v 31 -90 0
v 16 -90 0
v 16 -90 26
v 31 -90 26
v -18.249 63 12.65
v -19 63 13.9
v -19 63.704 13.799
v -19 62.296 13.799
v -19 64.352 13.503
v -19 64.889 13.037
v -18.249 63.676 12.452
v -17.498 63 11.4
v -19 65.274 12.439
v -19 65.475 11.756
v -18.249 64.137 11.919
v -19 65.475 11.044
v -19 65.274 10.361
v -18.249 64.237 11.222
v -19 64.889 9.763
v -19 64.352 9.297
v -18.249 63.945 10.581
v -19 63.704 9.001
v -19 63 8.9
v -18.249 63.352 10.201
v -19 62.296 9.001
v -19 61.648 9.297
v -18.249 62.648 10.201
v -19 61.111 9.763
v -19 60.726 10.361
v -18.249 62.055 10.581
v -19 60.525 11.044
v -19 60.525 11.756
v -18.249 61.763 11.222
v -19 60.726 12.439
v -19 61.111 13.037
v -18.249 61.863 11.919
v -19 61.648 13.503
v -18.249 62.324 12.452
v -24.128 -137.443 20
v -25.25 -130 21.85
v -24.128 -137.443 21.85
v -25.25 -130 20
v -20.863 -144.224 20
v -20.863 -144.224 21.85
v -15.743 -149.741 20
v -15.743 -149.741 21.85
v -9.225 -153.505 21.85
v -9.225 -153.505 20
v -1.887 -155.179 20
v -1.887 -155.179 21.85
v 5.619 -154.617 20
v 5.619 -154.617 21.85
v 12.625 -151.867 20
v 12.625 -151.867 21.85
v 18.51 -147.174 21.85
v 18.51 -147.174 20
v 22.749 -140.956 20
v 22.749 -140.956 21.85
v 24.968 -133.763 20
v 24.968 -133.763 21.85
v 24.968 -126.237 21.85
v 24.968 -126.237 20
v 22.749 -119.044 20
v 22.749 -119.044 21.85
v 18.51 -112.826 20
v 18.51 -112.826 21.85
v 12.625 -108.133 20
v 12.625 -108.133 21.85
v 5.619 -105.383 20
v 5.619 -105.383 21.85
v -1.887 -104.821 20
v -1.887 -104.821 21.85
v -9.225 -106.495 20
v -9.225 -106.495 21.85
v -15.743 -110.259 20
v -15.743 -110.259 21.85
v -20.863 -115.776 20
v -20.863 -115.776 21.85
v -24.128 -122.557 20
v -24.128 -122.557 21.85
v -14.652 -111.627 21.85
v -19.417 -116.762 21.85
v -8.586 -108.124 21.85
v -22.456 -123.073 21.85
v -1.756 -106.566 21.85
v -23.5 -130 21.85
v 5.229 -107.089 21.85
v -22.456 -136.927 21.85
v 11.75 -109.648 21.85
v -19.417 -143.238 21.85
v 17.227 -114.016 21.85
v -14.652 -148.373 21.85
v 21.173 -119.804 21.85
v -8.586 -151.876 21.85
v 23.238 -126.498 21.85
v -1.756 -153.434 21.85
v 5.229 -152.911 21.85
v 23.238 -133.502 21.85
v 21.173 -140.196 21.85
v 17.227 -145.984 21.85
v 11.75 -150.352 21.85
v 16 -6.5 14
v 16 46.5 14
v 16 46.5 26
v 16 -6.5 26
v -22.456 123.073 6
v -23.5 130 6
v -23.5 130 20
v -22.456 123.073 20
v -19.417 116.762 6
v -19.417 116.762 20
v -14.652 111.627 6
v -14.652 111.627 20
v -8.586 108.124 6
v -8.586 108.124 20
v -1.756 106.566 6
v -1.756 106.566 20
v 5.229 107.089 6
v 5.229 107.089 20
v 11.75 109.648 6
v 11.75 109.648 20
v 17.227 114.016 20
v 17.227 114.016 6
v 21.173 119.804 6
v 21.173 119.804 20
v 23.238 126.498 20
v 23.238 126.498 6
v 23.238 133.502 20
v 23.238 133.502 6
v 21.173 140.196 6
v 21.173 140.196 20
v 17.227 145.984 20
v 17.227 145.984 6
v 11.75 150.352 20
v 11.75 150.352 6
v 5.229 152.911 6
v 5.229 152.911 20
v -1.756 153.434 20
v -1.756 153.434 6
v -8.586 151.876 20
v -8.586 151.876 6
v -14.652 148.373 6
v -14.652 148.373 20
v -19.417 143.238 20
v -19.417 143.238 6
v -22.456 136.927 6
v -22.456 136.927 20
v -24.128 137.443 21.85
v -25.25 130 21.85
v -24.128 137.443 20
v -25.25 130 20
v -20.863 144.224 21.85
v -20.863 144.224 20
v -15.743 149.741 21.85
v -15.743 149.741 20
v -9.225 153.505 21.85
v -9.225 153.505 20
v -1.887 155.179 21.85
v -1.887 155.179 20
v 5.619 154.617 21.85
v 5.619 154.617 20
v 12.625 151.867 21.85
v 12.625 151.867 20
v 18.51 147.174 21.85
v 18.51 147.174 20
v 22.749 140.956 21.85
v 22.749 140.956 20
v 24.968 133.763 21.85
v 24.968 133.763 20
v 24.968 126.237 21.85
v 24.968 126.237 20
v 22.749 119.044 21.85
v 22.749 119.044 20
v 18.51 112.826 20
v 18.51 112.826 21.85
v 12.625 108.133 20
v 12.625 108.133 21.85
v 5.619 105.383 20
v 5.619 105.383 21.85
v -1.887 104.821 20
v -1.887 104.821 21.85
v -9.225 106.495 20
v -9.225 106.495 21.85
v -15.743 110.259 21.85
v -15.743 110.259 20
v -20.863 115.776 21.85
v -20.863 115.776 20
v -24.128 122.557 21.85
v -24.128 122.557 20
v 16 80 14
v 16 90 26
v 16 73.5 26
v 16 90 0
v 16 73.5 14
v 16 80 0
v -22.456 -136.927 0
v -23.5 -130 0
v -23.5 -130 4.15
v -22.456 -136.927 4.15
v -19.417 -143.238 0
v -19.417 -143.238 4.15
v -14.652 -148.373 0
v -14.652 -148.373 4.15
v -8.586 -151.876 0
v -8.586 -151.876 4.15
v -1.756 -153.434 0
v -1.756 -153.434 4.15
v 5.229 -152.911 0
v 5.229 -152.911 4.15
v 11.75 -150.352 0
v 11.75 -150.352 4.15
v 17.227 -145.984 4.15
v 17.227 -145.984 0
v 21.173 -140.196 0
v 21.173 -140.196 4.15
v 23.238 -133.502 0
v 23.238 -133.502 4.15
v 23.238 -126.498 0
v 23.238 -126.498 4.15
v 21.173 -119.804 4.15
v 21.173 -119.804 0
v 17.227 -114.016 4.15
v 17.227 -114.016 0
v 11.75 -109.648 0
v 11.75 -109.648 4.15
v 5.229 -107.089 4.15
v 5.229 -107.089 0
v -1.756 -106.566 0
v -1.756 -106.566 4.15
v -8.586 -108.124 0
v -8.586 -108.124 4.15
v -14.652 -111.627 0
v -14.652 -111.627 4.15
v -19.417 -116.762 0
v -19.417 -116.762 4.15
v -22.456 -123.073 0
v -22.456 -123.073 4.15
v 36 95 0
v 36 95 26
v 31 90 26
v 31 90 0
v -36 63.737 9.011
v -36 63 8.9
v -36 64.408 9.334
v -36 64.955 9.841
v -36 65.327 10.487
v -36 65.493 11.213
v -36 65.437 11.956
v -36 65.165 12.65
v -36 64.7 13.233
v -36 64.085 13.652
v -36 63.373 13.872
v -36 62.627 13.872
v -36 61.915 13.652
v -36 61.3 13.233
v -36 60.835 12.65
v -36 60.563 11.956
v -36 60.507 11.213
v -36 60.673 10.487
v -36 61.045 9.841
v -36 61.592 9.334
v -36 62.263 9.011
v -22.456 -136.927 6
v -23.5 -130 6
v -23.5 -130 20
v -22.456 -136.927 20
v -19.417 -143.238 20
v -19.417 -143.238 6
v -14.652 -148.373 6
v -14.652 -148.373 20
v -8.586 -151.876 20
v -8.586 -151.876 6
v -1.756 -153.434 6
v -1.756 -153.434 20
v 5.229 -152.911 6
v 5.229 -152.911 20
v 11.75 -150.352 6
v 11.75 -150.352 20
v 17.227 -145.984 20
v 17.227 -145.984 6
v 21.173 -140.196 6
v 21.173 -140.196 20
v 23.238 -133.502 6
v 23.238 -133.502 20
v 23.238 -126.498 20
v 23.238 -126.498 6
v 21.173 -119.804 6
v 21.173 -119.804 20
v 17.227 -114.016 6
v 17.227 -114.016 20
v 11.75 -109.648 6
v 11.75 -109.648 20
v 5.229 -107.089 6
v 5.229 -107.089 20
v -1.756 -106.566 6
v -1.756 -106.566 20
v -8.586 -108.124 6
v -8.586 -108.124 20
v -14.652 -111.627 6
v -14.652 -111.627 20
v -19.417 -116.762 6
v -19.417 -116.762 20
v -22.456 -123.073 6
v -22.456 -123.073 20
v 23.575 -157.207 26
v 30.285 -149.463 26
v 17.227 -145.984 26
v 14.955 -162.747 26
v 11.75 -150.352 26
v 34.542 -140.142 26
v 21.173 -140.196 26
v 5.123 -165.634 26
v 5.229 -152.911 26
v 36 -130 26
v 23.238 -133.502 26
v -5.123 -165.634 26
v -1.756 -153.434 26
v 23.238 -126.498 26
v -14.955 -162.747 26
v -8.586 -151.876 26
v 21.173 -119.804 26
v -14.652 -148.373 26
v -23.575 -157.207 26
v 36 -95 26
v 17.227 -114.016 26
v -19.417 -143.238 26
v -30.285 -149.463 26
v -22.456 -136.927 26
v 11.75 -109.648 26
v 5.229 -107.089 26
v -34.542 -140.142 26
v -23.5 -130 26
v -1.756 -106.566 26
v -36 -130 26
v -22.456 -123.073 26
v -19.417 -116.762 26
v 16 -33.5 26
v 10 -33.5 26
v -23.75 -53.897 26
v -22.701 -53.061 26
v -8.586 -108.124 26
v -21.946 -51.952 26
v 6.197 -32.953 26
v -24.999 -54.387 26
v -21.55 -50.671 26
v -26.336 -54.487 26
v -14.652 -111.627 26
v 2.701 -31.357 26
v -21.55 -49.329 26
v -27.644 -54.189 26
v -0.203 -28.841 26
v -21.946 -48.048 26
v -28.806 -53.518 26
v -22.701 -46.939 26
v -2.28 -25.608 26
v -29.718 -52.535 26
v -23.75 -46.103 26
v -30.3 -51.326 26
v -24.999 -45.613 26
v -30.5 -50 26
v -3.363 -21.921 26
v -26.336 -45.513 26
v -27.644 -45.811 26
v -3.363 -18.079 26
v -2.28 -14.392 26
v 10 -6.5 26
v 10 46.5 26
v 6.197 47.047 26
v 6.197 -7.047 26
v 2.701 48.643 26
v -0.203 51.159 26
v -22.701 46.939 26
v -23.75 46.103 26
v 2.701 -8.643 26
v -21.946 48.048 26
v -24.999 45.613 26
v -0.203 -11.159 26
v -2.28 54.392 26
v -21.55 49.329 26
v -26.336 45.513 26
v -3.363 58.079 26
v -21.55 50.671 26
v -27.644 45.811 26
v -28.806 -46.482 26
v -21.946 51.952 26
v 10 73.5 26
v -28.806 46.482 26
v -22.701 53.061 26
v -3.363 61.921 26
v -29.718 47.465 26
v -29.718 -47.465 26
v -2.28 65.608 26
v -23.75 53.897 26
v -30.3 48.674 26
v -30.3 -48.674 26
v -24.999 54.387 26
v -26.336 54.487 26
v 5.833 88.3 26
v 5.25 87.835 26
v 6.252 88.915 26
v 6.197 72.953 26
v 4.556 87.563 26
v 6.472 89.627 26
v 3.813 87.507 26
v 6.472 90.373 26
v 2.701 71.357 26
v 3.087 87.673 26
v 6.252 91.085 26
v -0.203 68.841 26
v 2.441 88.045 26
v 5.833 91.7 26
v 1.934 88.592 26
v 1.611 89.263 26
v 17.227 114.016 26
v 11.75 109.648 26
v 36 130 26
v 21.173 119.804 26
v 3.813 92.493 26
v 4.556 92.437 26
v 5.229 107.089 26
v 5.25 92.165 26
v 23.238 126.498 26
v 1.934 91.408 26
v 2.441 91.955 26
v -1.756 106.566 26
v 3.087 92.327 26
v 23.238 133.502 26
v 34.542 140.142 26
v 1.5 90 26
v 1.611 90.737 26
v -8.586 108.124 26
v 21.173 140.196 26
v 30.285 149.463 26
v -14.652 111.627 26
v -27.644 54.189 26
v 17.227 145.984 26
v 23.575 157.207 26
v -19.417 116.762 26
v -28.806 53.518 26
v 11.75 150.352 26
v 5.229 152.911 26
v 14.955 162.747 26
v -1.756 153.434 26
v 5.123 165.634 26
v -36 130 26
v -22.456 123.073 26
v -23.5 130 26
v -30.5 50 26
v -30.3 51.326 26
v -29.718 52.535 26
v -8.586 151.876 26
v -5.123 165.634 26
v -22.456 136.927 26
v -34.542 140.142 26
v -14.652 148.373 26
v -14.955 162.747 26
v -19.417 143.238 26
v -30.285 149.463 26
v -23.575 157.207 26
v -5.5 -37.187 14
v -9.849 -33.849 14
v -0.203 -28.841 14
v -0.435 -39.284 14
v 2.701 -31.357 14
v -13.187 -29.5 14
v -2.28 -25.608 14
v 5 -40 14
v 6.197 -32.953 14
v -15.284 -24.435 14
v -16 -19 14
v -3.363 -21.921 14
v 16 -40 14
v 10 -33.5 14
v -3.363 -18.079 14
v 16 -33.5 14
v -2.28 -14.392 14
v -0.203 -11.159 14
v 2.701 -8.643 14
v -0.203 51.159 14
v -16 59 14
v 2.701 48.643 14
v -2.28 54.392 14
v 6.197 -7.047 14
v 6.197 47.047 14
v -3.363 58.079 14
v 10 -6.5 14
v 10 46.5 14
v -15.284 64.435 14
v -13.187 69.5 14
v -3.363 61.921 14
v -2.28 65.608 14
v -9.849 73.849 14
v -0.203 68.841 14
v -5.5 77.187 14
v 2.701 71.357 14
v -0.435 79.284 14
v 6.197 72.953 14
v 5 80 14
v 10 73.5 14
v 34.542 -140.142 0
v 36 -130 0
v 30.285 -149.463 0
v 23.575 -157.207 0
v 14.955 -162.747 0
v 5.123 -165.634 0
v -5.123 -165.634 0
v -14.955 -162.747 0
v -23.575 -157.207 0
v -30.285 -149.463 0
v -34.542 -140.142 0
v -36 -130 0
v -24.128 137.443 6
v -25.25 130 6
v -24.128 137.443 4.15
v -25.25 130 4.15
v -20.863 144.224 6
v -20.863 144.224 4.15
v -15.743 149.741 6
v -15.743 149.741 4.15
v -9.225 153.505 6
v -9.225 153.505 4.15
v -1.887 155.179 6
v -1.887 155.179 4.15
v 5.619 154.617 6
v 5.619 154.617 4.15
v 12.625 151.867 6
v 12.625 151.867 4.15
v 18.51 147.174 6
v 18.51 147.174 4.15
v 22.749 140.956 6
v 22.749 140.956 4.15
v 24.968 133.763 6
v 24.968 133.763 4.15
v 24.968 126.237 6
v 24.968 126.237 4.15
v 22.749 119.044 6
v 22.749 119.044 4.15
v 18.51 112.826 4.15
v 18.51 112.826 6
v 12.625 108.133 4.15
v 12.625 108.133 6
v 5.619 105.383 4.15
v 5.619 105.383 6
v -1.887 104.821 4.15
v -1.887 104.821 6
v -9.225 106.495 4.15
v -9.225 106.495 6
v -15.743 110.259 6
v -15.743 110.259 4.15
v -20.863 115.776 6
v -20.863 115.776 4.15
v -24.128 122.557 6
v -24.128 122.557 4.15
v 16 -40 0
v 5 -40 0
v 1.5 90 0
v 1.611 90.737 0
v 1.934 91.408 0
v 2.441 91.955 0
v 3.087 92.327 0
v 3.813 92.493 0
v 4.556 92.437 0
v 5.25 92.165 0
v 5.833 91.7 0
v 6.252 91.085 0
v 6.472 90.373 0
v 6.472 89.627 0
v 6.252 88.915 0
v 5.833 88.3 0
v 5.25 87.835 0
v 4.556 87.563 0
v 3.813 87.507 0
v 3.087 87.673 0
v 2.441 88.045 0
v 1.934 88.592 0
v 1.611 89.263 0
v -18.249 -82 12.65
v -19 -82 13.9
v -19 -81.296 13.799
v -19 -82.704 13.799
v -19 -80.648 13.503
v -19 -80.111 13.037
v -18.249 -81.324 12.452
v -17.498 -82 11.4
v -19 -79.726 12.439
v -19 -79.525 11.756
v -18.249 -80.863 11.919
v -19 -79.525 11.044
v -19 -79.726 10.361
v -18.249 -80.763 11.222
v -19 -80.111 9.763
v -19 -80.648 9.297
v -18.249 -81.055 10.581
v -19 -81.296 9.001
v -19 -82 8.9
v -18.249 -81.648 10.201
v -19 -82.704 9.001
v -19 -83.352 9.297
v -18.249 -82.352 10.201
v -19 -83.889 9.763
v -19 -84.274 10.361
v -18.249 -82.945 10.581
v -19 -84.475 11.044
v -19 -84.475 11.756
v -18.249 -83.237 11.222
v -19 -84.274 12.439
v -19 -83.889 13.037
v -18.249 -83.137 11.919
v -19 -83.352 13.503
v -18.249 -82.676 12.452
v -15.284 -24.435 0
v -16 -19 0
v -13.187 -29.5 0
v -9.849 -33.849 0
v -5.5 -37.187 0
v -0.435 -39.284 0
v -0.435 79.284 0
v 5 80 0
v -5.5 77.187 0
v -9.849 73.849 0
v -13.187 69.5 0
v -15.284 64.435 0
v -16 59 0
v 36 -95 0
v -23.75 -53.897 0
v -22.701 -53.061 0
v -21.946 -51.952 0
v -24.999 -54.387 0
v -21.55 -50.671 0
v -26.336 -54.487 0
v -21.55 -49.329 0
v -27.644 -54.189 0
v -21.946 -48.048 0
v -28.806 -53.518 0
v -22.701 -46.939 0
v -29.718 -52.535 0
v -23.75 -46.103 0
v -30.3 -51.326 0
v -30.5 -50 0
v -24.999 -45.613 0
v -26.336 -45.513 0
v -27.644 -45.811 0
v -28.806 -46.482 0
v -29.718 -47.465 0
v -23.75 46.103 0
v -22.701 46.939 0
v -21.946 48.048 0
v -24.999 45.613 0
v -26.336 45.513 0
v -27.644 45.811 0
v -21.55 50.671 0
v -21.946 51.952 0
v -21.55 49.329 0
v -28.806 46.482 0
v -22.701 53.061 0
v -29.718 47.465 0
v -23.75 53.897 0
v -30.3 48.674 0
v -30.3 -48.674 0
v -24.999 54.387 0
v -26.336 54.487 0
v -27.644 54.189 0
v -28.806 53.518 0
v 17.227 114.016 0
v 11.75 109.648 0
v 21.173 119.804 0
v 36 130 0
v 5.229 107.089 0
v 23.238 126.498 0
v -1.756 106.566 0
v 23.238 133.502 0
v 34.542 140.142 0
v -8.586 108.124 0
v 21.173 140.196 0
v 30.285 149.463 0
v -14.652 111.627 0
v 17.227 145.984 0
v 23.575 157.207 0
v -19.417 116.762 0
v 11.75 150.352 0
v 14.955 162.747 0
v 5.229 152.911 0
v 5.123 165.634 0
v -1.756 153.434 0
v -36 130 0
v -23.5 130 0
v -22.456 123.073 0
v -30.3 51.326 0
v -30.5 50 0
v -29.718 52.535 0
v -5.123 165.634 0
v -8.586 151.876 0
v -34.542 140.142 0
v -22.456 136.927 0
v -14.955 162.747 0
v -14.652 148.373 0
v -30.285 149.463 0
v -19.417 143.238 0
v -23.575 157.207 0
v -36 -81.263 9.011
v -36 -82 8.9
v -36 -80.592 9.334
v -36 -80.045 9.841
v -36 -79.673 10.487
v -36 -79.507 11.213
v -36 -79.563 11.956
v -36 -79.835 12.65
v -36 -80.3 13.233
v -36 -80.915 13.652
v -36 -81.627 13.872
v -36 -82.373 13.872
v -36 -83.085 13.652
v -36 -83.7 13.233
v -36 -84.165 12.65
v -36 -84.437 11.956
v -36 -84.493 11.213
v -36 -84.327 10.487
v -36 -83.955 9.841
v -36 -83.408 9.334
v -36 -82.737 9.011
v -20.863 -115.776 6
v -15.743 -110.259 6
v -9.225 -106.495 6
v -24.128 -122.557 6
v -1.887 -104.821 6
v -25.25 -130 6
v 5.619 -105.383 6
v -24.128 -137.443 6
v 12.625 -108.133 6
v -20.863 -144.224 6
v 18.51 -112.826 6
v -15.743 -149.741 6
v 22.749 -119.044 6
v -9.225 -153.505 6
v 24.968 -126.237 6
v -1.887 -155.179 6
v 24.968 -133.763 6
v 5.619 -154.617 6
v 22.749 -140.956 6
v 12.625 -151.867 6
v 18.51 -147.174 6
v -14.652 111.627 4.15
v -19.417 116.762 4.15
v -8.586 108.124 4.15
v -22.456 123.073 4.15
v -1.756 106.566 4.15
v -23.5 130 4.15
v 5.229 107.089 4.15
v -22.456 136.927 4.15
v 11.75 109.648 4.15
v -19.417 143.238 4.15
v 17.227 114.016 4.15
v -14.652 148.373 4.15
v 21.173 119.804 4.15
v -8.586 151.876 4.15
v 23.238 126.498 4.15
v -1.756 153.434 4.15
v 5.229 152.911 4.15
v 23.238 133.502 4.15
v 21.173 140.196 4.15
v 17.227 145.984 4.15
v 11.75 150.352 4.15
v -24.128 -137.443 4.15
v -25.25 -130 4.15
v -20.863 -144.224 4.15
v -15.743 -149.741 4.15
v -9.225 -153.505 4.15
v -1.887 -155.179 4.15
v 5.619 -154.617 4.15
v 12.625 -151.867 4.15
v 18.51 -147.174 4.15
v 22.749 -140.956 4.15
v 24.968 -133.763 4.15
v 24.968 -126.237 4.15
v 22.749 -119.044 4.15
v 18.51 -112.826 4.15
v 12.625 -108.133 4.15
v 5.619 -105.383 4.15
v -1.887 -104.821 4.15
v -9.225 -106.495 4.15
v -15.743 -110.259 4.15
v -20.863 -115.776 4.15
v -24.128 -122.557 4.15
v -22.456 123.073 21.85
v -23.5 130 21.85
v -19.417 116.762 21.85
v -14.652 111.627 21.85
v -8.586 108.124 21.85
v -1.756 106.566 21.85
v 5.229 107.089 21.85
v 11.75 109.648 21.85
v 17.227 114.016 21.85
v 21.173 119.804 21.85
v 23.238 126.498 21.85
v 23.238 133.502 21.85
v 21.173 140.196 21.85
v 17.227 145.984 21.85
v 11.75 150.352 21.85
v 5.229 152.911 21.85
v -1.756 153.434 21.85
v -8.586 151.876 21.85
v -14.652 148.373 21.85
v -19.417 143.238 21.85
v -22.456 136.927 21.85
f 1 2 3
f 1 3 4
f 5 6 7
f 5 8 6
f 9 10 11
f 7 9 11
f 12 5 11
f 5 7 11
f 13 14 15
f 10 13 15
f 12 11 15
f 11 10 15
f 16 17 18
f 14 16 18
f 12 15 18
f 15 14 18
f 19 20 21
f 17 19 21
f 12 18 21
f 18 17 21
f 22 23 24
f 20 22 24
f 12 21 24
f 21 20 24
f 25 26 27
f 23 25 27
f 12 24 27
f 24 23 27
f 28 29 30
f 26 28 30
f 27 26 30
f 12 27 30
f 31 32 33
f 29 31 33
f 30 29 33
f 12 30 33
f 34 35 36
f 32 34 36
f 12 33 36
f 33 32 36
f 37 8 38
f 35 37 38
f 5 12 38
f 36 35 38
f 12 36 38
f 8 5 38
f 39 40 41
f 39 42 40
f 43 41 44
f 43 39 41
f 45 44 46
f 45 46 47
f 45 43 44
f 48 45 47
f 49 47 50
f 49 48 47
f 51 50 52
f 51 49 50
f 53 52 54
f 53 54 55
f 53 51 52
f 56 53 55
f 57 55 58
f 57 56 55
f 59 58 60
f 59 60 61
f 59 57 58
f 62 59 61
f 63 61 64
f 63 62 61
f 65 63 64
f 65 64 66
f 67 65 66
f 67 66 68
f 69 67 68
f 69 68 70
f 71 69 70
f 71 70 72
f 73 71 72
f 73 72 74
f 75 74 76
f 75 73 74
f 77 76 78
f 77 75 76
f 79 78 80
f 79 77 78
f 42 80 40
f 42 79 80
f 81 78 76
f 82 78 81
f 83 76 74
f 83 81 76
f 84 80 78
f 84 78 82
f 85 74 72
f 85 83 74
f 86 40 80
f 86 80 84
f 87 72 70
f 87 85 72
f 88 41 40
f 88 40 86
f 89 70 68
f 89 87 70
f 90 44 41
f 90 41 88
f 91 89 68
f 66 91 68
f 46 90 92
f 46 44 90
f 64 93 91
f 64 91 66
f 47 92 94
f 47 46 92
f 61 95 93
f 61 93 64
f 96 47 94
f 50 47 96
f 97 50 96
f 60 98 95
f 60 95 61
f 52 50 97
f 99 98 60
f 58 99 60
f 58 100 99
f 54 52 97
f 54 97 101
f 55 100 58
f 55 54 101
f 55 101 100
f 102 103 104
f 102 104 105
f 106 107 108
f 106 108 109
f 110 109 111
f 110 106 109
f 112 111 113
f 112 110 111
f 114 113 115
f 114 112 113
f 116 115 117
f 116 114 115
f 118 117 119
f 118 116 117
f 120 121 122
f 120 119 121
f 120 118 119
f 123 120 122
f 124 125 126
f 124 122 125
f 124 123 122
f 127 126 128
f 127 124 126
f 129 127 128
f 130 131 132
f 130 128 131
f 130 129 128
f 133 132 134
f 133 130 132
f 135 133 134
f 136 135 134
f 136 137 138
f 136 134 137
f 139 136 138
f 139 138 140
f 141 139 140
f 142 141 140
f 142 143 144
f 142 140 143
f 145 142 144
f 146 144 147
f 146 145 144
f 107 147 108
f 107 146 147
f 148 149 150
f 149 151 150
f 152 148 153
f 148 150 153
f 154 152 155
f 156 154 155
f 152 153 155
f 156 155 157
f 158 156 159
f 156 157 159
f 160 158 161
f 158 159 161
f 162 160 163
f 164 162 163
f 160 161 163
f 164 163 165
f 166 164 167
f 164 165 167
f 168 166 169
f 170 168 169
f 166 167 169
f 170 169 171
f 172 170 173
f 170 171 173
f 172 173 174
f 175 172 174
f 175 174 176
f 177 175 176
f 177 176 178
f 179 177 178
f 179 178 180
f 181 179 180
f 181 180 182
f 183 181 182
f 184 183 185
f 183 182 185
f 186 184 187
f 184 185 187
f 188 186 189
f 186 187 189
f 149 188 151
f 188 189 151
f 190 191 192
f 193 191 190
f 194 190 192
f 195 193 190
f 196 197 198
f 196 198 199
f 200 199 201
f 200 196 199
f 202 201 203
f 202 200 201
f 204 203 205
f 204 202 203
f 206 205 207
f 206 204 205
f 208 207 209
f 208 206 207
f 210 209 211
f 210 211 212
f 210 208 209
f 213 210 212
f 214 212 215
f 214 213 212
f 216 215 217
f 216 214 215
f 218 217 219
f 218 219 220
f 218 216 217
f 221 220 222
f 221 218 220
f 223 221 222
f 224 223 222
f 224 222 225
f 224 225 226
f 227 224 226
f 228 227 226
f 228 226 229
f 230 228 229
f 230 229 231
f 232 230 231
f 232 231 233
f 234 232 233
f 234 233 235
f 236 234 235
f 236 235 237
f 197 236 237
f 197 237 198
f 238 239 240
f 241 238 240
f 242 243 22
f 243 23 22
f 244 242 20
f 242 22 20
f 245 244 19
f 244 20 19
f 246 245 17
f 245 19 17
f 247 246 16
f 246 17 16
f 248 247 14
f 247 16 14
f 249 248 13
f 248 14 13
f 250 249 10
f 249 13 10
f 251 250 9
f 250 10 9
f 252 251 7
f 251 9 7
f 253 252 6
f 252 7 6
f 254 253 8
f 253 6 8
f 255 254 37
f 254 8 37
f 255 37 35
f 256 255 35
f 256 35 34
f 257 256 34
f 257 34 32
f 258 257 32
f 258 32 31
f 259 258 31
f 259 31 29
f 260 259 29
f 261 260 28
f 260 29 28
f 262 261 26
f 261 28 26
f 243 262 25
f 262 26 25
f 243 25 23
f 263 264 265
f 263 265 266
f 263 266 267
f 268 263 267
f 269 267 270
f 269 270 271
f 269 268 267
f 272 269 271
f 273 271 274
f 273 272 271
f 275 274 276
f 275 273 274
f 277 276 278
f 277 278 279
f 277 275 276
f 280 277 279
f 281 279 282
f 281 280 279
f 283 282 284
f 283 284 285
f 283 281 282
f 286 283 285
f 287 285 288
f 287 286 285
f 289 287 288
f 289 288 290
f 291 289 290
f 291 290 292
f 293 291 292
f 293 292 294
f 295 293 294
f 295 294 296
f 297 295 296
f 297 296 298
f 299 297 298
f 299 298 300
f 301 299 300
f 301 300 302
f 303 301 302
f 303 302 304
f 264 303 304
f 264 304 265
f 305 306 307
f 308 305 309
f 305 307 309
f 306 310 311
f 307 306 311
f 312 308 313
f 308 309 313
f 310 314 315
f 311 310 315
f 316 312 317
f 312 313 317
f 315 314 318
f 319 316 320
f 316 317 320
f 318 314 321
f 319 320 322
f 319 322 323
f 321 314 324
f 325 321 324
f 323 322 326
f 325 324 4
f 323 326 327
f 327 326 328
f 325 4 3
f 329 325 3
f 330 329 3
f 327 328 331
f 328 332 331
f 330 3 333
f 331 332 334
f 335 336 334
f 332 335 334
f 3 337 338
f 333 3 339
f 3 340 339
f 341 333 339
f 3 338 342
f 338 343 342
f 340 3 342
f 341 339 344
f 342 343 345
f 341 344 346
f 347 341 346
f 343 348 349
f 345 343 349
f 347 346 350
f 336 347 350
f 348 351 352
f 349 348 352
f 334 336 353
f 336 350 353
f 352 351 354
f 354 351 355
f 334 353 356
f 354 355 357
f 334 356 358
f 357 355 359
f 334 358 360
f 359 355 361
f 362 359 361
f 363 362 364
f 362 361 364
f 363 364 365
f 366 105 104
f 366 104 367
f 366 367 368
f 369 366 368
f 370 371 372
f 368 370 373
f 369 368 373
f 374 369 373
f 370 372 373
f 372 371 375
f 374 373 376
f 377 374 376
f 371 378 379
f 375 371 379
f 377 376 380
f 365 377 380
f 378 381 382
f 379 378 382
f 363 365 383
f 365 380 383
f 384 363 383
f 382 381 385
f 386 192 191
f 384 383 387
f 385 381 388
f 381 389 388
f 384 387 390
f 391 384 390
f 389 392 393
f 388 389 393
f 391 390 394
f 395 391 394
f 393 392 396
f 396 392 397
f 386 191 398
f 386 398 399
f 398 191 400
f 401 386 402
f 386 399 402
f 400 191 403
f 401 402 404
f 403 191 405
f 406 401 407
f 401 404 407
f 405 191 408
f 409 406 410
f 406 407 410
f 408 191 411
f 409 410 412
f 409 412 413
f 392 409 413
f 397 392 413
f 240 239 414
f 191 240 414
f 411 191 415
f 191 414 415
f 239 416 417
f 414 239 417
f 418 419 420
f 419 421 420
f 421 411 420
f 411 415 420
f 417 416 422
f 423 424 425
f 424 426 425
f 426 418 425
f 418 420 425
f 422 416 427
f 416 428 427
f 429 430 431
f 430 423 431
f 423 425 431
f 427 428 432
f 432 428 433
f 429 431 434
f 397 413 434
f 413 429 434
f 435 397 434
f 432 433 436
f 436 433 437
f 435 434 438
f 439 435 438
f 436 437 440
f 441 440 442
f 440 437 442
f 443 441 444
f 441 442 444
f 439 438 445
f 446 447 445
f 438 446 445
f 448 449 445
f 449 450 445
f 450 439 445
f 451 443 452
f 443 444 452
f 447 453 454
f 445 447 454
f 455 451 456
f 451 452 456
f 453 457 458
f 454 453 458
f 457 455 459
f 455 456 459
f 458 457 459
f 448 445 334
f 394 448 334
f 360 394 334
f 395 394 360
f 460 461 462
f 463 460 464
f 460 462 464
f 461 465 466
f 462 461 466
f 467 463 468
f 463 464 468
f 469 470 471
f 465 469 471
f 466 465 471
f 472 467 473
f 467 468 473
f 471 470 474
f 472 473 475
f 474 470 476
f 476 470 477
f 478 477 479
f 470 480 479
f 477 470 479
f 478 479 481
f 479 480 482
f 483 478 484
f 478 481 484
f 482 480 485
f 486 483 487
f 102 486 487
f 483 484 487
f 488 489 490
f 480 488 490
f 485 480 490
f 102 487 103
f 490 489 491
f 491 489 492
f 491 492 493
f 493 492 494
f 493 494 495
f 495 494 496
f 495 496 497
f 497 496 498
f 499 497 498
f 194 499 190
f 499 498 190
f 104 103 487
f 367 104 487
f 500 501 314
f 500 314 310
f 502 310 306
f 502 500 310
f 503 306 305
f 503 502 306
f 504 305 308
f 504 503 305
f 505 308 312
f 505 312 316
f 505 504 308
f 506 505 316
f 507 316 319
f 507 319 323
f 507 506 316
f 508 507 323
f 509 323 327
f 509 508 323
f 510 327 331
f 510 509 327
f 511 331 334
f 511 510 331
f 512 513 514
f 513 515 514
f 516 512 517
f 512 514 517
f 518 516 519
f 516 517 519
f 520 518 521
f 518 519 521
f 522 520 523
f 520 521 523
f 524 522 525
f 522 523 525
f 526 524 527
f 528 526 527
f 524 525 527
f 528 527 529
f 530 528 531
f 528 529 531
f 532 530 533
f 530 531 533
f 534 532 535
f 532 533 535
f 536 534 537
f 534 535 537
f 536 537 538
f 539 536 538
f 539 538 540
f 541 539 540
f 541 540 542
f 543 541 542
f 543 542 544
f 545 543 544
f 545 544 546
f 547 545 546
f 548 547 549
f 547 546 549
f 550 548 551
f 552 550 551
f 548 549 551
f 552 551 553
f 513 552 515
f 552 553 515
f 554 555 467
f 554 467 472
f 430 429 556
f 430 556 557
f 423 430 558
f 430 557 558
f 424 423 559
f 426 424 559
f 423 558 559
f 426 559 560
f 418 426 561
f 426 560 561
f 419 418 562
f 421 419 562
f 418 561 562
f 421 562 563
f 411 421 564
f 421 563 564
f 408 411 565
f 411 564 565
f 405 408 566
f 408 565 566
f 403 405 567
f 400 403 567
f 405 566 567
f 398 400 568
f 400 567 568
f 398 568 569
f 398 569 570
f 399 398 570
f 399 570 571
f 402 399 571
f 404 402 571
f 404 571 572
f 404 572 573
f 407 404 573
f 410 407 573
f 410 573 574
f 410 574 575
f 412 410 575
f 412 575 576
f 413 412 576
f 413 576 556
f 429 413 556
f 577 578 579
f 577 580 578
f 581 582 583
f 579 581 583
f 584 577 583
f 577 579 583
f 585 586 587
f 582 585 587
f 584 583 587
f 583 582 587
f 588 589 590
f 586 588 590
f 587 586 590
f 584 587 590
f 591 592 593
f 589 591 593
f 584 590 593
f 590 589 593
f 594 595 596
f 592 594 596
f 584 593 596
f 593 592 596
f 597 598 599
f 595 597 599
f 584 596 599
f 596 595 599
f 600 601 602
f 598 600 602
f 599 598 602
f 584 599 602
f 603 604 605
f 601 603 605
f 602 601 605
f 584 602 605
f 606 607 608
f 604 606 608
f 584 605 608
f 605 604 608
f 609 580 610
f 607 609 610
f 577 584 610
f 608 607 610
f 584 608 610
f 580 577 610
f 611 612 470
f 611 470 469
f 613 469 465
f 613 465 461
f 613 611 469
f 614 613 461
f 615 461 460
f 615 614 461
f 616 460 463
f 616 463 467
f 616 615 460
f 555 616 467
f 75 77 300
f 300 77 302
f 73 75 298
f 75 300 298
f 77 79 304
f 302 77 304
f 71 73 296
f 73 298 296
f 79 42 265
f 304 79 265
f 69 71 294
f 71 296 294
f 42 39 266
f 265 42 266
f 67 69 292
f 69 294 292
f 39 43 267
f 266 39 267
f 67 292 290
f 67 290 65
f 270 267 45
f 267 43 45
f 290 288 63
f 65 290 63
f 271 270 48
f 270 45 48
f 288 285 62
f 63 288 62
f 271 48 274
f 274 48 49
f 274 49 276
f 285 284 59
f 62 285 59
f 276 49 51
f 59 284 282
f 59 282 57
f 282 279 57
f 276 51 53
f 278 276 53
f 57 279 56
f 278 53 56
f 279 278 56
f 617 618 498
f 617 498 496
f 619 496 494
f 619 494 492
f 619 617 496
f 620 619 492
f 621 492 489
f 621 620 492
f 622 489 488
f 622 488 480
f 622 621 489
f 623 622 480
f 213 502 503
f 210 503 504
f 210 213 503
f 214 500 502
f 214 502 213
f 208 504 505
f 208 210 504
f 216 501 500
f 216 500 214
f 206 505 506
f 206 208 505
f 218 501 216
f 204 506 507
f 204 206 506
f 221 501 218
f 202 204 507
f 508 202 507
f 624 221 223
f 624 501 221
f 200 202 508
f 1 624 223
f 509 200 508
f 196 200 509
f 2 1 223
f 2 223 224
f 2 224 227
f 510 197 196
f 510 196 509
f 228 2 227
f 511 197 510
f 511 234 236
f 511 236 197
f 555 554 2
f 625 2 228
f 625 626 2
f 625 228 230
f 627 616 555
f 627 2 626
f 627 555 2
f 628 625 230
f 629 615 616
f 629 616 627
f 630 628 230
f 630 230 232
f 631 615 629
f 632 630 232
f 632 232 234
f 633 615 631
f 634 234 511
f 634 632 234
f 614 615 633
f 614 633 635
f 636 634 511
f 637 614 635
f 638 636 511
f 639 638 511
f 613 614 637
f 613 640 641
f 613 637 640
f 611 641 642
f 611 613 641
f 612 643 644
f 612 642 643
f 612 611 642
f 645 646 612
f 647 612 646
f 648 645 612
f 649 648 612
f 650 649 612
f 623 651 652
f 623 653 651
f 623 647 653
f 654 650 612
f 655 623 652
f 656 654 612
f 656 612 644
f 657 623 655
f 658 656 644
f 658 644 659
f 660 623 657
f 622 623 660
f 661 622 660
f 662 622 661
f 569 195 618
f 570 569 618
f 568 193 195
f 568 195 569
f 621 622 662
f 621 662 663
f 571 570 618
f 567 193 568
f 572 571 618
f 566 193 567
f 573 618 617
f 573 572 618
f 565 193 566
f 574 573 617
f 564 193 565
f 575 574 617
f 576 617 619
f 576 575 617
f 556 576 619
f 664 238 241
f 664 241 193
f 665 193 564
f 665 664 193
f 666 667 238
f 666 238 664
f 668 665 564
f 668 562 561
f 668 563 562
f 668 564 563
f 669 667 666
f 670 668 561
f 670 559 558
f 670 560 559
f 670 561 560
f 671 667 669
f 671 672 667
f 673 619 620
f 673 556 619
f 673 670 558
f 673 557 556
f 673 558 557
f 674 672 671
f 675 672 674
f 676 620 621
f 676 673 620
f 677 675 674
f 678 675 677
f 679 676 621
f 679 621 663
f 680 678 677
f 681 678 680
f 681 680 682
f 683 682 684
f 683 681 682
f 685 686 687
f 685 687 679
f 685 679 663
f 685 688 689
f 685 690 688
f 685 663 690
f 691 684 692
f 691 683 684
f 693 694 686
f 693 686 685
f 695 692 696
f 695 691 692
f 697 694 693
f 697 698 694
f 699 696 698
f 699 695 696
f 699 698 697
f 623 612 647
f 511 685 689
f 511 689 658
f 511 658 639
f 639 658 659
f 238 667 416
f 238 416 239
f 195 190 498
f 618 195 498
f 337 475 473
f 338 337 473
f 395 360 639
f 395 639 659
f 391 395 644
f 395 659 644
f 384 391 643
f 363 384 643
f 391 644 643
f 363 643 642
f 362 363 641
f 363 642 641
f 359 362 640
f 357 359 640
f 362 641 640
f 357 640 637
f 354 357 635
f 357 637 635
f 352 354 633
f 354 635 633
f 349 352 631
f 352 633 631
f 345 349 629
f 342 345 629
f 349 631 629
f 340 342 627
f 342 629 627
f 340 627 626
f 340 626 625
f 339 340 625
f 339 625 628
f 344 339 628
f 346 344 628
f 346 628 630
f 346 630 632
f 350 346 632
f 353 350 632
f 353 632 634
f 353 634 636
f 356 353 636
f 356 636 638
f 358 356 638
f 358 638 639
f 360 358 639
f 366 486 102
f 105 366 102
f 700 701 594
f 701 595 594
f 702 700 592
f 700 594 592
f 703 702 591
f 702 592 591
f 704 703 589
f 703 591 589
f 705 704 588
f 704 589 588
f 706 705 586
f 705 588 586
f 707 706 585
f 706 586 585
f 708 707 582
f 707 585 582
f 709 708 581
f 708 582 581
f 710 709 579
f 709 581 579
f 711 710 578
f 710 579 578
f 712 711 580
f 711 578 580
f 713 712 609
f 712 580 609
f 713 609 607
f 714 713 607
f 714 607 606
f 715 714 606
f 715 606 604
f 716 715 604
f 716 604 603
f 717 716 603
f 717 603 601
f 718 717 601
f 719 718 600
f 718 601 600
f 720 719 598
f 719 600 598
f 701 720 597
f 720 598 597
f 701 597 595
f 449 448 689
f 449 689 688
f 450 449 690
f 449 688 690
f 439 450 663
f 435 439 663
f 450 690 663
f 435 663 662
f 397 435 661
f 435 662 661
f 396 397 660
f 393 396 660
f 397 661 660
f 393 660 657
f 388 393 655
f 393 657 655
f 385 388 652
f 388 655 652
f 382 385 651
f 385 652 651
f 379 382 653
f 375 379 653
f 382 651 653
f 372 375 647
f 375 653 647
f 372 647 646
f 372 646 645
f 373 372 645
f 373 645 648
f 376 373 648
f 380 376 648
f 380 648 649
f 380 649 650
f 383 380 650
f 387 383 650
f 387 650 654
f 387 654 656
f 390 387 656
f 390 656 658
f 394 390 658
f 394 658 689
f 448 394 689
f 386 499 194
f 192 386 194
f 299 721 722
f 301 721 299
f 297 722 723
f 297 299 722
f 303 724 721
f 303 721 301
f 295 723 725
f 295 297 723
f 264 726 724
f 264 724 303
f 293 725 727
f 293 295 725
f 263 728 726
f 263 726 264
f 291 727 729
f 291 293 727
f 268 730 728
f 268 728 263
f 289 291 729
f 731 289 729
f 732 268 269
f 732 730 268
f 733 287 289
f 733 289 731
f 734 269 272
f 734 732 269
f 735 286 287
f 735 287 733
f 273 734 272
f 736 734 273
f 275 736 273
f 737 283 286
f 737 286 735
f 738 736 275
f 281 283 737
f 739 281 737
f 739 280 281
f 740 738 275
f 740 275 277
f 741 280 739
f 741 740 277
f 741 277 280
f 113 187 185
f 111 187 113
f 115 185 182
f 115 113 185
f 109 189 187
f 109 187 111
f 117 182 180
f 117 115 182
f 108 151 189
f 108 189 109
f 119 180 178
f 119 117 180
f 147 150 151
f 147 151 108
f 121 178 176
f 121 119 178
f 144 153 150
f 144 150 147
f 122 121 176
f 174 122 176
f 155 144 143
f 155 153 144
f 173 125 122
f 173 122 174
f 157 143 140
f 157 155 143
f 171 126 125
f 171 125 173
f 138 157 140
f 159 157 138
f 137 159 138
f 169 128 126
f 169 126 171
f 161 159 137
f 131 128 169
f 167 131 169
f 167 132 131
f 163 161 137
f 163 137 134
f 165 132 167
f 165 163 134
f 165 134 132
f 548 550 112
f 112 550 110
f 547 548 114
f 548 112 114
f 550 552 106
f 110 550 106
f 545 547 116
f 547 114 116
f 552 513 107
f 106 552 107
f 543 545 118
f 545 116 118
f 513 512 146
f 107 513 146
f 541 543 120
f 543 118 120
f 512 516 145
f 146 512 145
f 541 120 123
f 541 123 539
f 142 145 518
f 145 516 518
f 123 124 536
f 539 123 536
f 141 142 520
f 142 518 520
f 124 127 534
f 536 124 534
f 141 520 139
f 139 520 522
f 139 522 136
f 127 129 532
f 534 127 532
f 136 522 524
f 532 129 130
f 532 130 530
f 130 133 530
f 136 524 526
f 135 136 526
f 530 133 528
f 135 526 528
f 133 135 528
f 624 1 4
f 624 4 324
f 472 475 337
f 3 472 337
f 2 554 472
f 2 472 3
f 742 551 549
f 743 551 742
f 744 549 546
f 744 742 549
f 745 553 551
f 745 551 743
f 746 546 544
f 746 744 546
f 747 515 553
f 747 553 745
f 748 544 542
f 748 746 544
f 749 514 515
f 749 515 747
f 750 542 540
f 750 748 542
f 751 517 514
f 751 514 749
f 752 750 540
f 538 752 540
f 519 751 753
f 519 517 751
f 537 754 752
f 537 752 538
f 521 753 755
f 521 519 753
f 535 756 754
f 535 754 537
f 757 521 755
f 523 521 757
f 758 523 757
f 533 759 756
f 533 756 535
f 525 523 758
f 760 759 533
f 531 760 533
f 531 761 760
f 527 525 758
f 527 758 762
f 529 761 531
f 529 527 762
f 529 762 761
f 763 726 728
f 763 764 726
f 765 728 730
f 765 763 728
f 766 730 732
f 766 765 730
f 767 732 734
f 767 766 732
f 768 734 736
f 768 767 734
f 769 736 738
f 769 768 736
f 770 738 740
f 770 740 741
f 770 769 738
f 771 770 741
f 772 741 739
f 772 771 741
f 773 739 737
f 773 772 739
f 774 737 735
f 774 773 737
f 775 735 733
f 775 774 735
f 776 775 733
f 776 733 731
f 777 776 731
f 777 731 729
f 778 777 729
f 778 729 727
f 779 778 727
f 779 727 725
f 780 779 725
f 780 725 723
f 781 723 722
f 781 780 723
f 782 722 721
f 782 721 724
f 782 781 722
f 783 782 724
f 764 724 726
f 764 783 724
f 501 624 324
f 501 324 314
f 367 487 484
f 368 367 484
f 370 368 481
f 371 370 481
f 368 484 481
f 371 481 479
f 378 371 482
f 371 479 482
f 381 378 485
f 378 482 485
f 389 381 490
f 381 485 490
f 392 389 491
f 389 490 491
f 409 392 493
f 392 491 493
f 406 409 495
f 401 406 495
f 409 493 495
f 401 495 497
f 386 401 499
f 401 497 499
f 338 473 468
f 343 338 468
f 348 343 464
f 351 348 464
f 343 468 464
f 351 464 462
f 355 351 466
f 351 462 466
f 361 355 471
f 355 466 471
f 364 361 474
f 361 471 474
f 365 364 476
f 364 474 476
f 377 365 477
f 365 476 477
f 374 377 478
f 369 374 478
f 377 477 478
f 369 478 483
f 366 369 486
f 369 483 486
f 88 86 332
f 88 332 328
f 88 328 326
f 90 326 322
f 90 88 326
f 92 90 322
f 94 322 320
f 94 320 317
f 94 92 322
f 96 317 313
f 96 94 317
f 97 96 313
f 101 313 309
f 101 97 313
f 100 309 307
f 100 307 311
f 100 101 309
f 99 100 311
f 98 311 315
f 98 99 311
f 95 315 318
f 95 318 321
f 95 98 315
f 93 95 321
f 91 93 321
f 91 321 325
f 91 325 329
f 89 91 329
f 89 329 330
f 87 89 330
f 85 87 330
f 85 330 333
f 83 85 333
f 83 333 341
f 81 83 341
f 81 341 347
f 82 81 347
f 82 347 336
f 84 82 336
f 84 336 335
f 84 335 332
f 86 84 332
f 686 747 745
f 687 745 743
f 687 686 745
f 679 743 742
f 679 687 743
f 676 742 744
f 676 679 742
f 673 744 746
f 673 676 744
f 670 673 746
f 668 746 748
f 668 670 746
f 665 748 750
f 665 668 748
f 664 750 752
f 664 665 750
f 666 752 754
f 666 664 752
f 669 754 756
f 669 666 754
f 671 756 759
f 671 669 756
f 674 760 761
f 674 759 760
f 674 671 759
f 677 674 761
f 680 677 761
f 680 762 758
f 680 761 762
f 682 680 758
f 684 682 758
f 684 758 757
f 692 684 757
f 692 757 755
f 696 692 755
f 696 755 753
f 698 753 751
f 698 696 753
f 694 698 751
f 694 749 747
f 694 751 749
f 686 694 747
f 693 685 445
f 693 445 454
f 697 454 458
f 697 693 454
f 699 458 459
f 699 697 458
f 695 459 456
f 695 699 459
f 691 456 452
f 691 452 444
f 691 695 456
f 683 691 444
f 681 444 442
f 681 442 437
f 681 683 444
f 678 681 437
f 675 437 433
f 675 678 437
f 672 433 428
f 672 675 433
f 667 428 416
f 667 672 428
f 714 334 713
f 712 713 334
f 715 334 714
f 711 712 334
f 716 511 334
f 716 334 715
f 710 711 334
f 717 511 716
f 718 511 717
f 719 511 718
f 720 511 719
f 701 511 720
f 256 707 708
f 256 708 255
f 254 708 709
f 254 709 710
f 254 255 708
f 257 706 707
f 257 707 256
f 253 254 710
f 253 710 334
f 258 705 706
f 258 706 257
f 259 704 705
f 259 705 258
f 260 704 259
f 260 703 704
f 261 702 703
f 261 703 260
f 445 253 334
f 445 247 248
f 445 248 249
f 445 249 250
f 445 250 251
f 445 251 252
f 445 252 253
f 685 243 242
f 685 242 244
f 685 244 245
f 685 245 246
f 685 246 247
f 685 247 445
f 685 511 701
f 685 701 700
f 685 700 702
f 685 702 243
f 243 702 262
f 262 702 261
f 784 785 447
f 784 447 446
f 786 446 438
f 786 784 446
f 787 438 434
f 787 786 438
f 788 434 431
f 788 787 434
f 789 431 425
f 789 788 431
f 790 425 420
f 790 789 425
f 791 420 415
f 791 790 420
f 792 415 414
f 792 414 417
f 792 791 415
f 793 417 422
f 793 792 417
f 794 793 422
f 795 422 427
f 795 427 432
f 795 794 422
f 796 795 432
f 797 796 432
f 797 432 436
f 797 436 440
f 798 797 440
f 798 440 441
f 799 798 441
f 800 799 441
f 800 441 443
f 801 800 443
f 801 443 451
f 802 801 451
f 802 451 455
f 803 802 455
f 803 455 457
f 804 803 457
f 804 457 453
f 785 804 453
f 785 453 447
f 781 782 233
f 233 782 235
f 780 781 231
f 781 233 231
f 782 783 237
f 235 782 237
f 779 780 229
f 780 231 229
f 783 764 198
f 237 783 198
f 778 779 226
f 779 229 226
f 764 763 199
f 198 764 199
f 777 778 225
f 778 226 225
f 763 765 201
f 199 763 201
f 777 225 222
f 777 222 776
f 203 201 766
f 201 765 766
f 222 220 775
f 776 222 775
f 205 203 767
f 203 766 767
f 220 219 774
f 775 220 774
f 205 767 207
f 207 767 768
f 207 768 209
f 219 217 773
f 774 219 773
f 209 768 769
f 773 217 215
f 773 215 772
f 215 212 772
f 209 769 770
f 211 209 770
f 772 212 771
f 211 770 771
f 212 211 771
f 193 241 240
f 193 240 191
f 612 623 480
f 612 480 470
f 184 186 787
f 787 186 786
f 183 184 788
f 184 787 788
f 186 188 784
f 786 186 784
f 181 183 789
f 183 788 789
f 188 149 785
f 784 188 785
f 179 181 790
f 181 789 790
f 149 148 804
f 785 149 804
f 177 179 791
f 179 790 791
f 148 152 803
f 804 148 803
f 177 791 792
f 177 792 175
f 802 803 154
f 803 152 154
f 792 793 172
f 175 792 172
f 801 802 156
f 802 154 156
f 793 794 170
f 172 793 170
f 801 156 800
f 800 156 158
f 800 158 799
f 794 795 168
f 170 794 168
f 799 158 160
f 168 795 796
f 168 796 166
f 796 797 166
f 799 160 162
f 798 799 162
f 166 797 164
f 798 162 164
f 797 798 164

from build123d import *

# Parameters (mm, degrees)
SKIZZE1_R                       = 23.5
AUFSATZ_LINEAR_AUSTRAGEN1_DEPTH = 26
F_9_0_9_DURCHMESSER_BOHRUNG1_D  = 9
SKIZZE5_W                       = 1.85
SKIZZE5_H                       = 1.75
SCHNITT_LINEAR_AUSTRAGEN1_DEPTH = 14
M6_GEWINDEBOHRUNG1_D            = 5
M6_GEWINDEBOHRUNG1_DEPTH        = 17
M6_GEWINDEBOHRUNG1_TIP          = 1.502151548
SCHNITT_LINEAR_AUSTRAGEN2_DEPTH = 171.434738243
M6_GEWINDEBOHRUNG2_D            = 5


with BuildPart() as part:
    # Skizze1 → Aufsatz-Linear austragen1 (new body)
    with BuildSketch(Plane.XY):
        with BuildLine():
            Line((31, 90), (16, 90))
            Line((16, 90), (16, -90))
            Line((16, -90), (31, -90))
            Line((31, -90), (36, -95))
            Line((36, -95), (36, -130))
            ThreePointArc((36, -130), (0, -166), (-36, -130))
            Line((-36, -130), (-36, 130))
            ThreePointArc((-36, 130), (0, 166), (36, 130))
            Line((36, 130), (36, 95))
            Line((36, 95), (31, 90))
        make_face()
        with Locations(Location((0, -130, 0), (0, 0, 180))):
            Circle(SKIZZE1_R, mode=Mode.SUBTRACT)
        with Locations(Location((0, 130, 0), (0, 0, 180))):
            Circle(SKIZZE1_R, mode=Mode.SUBTRACT)
    extrude(amount=AUFSATZ_LINEAR_AUSTRAGEN1_DEPTH)

    # Ø9.0 (9) Durchmesser Bohrung1 (through all)
    with Locations(Plane.XY.offset(26)):
        with Locations((-26, 50), (-26, -50)):
            Hole(F_9_0_9_DURCHMESSER_BOHRUNG1_D / 2)

    # Skizze5 → Schnitt-Rotation1 (revolve, cut)
    with BuildSketch(Plane(origin=(0, 0, 0), x_dir=(0, 0, -1), z_dir=(1, 0, 0)), mode=Mode.PRIVATE) as schnitt_rotation1_sk:
        with Locations((-20.925, 154.375)):
            Rectangle(SKIZZE5_W, SKIZZE5_H)
        with Locations((-5.075, 154.375)):
            Rectangle(SKIZZE5_W, SKIZZE5_H)
    schnitt_rotation1 = revolve(schnitt_rotation1_sk.sketch.rotate(Axis((0, 130, 39.739957874), (0, 0, -1)), 270), axis=Axis((0, 130, 39.739957874), (0, 0, -1)), mode=Mode.SUBTRACT)

    # Spiegeln1: Schnitt-Rotation1 across plane
    add(schnitt_rotation1.mirror(Plane.ZX), mode=Mode.SUBTRACT)

    # Skizze6 → Schnitt-Linear austragen1 (cut)
    with BuildSketch(Plane(origin=(0, 0, 0), x_dir=(-1, 0, 0), z_dir=(0, 0, -1))):
        with BuildLine():
            Line((-16, -40), (-16, 80))
            Line((-16, 80), (-5, 80))
            ThreePointArc((-5, 80), (9.849242405, 73.849242405), (16, 59))
            Line((16, 59), (16, -19))
            ThreePointArc((16, -19), (9.849242405, -33.849242405), (-5, -40))
            Line((-5, -40), (-16, -40))
        make_face()
    extrude(amount=-SCHNITT_LINEAR_AUSTRAGEN1_DEPTH, mode=Mode.SUBTRACT)

    # M6 Gewindebohrung1
    with Locations(Plane.ZY.offset(36)):
        with Locations((11.4, 63), (11.4, -82)):
            Hole(M6_GEWINDEBOHRUNG1_D / 2, depth=M6_GEWINDEBOHRUNG1_DEPTH)
            with Locations((0, 0, -(M6_GEWINDEBOHRUNG1_DEPTH + M6_GEWINDEBOHRUNG1_TIP / 2))):  # 118° drill point
                Cone(0, M6_GEWINDEBOHRUNG1_D / 2, M6_GEWINDEBOHRUNG1_TIP, mode=Mode.SUBTRACT)

    # Skizze9 → Schnitt-Linear austragen2 (cut, through all)
    with BuildSketch(Plane(origin=(0, 0, 14), x_dir=(-1, 0, 0), z_dir=(0, 0, -1))):
        with BuildLine():
            Line((-10, 73.5), (-16, 73.5))
            Line((-16, 73.5), (-16, 46.5))
            Line((-16, 46.5), (-10, 46.5))
            ThreePointArc((-10, 46.5), (3.5, 60), (-10, 73.5))
        make_face()
        with BuildLine():
            Line((-10, -6.5), (-16, -6.5))
            Line((-16, -6.5), (-16, -33.5))
            Line((-16, -33.5), (-10, -33.5))
            ThreePointArc((-10, -33.5), (3.5, -20), (-10, -6.5))
        make_face()
    extrude(amount=-SCHNITT_LINEAR_AUSTRAGEN2_DEPTH, mode=Mode.SUBTRACT)

    # M6 Gewindebohrung2 (through all)
    with Locations(Plane.XY.offset(26)):
        with Locations((4, 90)):
            Hole(M6_GEWINDEBOHRUNG2_D / 2)


solid = part.part
